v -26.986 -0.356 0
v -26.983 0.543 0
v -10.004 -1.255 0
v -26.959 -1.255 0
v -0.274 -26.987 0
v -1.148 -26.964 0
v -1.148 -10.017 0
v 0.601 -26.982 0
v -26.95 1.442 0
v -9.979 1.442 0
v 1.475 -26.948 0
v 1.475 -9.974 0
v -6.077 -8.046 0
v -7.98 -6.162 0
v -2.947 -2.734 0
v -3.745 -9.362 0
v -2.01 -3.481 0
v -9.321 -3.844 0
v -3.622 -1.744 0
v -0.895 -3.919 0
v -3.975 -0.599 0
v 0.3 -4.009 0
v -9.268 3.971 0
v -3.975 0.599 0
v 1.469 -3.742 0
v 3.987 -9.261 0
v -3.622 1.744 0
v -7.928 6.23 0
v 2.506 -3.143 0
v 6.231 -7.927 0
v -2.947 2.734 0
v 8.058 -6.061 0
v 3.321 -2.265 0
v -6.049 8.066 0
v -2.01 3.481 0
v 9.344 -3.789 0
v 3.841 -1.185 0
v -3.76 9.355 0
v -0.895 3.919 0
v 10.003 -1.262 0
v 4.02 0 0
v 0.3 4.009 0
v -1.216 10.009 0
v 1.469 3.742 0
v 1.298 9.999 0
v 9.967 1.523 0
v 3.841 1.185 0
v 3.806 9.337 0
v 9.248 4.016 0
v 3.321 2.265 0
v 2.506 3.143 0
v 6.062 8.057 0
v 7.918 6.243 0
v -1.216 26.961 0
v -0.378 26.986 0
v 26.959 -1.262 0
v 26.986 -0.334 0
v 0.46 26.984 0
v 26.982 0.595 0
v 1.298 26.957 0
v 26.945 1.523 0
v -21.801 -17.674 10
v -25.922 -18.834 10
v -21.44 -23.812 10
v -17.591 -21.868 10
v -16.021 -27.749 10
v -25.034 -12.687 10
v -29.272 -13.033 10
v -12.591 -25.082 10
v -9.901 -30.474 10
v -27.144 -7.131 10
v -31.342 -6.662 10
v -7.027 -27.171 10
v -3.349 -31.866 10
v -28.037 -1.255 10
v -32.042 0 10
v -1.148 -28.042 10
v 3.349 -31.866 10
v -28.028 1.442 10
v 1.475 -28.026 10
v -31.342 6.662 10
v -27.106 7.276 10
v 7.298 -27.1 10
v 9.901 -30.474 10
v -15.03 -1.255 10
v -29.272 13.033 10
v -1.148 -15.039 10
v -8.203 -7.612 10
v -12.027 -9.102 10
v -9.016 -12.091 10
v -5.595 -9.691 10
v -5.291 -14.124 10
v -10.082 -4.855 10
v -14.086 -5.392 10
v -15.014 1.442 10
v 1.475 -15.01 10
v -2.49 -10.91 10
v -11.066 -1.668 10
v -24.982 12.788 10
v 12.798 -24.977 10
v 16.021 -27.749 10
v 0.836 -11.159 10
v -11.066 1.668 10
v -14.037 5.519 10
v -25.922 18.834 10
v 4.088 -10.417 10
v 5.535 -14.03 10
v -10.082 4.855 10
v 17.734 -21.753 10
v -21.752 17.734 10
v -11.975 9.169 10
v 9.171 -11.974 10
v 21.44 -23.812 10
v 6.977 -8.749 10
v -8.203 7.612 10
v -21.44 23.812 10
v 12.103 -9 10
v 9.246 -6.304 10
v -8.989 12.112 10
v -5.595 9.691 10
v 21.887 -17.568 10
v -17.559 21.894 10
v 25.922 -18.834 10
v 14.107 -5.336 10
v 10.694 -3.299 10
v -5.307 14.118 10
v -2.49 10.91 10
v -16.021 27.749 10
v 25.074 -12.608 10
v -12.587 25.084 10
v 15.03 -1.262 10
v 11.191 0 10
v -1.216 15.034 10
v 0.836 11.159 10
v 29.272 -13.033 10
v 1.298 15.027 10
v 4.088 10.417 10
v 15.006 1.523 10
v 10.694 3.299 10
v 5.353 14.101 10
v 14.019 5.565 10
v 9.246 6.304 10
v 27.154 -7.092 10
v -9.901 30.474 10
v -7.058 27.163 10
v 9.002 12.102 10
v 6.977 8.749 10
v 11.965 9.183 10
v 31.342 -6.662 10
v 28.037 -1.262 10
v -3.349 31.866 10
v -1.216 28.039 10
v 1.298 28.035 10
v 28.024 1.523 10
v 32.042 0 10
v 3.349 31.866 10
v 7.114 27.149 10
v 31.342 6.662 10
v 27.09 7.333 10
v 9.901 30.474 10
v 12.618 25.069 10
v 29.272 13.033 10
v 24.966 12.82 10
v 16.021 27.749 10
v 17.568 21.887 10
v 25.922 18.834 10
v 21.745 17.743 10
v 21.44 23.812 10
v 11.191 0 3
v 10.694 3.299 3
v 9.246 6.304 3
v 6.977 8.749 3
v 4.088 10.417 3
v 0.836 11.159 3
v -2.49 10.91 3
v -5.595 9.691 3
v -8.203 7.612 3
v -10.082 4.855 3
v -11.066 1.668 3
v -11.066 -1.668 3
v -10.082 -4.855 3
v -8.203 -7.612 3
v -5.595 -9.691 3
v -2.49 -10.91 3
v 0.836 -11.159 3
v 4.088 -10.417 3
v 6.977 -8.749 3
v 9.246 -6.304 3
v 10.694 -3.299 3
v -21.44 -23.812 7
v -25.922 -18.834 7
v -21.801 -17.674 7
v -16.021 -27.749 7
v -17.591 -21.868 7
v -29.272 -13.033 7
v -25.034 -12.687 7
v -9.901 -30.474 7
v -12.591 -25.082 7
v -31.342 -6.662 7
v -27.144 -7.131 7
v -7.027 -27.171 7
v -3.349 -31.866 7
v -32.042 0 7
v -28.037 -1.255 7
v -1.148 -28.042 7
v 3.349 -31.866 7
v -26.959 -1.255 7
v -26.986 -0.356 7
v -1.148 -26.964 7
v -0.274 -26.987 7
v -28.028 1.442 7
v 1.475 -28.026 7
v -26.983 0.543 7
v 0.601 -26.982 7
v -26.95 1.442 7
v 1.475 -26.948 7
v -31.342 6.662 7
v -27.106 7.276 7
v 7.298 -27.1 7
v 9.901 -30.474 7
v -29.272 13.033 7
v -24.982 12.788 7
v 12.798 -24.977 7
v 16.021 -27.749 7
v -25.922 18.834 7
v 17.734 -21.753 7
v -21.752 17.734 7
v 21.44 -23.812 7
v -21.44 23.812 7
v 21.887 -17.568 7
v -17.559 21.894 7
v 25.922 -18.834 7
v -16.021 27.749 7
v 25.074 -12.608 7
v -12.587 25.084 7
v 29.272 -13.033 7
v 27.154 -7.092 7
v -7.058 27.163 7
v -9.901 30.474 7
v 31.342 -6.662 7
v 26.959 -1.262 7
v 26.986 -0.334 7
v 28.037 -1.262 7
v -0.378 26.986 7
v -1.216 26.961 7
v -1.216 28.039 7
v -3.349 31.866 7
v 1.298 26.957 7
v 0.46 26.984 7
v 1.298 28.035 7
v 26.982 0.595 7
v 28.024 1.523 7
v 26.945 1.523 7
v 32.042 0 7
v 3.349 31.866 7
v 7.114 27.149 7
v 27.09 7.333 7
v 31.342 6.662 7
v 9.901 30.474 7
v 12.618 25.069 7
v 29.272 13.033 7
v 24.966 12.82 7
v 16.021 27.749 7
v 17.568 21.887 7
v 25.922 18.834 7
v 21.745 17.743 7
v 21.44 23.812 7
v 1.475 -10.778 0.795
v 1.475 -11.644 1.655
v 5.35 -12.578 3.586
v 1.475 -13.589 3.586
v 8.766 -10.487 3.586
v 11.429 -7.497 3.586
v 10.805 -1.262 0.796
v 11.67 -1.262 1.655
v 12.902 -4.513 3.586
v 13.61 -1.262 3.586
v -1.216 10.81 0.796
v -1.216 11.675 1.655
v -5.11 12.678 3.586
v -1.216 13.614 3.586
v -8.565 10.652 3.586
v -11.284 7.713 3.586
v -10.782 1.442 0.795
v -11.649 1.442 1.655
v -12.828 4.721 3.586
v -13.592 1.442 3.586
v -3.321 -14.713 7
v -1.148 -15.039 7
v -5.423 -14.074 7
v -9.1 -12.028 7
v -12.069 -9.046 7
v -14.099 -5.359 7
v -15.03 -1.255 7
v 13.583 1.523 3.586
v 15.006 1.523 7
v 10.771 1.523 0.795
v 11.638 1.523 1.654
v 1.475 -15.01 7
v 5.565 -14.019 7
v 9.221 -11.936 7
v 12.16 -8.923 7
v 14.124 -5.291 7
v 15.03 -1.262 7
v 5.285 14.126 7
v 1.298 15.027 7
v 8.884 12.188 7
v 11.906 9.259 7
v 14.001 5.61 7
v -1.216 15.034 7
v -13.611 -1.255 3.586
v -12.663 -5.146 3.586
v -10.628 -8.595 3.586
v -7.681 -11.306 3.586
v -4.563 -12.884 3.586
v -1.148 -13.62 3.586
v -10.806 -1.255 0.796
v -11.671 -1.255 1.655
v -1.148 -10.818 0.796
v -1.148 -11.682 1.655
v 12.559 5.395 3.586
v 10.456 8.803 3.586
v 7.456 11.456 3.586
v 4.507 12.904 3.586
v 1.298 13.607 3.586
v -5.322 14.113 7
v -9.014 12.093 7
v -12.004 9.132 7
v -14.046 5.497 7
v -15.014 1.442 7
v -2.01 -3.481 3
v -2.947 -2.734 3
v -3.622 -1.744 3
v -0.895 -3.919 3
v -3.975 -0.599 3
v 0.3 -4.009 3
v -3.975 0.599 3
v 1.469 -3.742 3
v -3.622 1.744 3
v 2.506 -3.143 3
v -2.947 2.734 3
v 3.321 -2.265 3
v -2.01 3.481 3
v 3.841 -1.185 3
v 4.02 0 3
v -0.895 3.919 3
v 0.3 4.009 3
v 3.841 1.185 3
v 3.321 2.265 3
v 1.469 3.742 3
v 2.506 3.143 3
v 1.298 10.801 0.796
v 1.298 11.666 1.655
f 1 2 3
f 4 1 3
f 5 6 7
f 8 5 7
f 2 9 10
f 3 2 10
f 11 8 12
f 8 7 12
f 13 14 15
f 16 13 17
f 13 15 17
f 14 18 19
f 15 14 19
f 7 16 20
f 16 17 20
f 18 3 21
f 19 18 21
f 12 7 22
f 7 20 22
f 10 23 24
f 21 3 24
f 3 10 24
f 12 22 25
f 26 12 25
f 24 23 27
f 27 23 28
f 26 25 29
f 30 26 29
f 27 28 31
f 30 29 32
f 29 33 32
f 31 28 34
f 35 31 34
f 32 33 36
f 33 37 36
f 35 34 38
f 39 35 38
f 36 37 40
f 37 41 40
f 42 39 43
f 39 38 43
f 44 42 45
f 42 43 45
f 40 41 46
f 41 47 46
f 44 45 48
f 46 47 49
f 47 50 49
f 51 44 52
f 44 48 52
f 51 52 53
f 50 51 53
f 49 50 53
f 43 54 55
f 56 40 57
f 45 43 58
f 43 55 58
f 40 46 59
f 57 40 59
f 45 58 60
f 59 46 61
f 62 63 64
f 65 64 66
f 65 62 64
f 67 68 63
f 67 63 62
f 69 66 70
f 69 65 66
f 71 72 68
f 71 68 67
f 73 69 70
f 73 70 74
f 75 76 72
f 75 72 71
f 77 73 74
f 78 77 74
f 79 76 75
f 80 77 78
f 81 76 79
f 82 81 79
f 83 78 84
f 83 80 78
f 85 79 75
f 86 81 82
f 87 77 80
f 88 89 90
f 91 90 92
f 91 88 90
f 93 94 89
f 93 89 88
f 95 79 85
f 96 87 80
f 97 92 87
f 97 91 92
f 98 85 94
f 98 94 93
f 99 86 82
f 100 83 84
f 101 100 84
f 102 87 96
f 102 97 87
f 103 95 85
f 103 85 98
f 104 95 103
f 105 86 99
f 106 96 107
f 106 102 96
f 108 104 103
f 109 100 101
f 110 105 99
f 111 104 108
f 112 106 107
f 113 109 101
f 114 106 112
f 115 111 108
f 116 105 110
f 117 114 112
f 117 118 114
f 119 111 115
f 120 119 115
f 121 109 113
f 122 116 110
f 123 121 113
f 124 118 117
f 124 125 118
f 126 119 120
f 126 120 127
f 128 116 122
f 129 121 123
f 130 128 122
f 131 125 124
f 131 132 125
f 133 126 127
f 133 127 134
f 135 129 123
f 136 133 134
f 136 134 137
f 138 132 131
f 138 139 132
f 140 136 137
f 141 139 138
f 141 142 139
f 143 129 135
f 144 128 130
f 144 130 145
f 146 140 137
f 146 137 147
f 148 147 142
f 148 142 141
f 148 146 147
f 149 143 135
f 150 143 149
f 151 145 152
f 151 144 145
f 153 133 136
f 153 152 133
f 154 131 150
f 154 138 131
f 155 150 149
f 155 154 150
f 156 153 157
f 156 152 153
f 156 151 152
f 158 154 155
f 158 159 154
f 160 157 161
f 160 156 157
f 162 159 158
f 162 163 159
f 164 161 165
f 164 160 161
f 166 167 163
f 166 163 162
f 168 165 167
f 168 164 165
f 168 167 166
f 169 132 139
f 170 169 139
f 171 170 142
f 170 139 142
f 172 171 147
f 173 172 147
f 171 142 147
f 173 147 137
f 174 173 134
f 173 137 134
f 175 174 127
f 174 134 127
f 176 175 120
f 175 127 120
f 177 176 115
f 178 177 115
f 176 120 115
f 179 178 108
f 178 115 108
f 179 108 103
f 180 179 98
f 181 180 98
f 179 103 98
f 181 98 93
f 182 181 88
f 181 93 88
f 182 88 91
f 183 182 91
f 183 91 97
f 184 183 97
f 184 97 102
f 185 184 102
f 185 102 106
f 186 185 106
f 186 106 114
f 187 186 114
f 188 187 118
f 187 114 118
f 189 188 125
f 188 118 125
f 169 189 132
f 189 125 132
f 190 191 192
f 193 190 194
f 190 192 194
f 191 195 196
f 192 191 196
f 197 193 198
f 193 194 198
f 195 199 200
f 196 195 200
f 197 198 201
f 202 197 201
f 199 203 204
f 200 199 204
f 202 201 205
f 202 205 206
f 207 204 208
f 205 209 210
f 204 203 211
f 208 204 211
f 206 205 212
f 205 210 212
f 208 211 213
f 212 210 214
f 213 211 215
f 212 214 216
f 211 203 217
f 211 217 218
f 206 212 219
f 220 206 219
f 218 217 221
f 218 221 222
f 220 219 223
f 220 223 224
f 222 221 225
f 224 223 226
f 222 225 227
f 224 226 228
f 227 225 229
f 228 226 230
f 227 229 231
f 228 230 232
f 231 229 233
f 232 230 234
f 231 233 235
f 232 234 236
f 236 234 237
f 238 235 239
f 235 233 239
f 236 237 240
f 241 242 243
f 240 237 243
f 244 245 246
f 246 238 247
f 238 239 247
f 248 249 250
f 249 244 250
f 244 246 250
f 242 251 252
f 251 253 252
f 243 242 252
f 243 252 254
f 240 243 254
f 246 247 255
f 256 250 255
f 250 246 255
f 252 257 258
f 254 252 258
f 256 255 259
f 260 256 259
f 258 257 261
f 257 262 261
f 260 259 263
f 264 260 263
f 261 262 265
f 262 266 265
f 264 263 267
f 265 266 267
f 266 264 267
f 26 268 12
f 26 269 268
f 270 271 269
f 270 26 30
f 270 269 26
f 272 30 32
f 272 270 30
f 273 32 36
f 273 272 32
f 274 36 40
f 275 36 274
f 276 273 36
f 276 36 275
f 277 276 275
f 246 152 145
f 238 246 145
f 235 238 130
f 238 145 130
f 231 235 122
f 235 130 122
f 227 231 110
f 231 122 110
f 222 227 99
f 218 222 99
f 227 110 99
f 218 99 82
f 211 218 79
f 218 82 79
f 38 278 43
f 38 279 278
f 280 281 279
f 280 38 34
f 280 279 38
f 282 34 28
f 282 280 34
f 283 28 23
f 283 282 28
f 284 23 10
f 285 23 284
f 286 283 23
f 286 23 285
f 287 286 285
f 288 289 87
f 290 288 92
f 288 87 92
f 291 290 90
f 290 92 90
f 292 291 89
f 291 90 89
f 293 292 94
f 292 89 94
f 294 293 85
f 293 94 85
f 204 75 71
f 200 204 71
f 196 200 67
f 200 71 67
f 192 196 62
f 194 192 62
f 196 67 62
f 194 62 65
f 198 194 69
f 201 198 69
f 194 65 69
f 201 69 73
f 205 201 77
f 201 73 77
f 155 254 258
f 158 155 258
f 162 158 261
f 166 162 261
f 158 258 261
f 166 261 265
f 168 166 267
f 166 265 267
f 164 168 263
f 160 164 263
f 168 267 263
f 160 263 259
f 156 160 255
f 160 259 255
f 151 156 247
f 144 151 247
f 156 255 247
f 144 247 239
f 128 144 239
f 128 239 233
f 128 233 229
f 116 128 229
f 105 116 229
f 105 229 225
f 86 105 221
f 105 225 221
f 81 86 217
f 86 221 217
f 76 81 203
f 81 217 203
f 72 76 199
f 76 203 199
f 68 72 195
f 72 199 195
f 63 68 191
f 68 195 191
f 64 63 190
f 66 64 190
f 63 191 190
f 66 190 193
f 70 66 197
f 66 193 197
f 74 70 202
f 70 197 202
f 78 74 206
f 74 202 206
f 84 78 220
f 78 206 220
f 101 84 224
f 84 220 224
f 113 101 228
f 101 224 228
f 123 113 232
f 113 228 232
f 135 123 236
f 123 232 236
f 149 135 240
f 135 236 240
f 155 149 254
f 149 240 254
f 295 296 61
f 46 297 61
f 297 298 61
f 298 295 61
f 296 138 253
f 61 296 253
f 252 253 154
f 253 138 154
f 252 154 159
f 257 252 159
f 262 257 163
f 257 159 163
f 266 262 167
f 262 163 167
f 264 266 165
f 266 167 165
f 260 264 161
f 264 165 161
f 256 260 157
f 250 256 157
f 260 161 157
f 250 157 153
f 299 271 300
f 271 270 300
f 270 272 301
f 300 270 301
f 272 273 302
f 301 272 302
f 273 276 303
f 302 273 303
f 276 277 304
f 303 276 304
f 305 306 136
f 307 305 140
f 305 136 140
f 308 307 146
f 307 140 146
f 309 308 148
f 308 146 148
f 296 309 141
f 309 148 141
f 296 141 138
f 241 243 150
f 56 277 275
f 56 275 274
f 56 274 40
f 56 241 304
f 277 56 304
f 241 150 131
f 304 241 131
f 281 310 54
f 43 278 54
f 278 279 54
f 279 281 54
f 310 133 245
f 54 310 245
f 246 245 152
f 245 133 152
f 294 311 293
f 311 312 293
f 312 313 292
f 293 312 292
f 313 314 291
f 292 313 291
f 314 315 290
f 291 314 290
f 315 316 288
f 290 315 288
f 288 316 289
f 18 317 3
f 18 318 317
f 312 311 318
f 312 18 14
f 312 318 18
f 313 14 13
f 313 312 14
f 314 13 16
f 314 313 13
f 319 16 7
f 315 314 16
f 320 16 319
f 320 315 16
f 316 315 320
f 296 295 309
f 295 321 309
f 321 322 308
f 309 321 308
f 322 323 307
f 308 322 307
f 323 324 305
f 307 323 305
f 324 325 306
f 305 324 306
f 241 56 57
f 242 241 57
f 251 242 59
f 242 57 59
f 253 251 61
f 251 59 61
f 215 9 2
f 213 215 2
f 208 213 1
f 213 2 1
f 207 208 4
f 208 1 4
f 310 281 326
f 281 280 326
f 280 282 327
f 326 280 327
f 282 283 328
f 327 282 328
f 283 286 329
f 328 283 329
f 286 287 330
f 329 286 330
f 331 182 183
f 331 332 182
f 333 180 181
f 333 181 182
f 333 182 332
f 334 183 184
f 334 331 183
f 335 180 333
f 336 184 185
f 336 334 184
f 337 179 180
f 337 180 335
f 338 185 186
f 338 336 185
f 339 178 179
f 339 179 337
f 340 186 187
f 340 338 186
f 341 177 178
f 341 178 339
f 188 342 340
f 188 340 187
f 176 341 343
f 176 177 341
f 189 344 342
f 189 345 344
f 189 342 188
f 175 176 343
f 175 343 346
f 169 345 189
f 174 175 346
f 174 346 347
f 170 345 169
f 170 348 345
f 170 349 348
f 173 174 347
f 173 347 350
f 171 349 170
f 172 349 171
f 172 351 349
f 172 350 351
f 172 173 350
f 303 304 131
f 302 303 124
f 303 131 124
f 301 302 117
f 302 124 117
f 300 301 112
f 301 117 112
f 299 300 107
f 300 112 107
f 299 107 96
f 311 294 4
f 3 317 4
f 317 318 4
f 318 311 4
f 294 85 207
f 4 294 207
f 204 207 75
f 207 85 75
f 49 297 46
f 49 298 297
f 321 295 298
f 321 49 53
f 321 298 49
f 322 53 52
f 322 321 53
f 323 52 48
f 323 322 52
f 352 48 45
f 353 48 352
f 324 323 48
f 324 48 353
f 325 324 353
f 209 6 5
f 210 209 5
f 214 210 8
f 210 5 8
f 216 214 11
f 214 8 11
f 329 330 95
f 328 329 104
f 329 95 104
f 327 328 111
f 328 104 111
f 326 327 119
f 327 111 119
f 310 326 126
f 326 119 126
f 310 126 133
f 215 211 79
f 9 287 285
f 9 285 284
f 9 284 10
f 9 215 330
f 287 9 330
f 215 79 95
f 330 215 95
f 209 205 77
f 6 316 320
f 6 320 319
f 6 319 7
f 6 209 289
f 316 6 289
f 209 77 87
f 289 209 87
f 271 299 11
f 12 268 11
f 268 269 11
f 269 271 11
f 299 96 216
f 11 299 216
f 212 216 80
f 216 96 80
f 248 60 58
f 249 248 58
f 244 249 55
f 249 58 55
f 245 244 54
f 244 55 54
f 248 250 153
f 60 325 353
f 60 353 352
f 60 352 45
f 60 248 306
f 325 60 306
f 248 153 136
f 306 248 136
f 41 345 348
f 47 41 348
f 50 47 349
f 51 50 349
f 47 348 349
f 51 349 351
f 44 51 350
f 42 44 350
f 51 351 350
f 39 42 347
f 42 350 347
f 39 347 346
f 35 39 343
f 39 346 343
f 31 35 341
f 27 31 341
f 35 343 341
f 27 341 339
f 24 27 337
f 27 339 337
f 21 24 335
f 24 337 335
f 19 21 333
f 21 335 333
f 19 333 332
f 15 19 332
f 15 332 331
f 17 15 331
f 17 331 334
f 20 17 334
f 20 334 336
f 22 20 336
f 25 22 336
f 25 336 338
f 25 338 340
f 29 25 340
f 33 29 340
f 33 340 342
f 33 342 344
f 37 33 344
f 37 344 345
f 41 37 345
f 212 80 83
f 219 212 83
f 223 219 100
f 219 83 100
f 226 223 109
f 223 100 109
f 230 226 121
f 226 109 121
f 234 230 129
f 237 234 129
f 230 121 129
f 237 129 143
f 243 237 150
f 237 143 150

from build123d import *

# Parameters (mm, degrees)
F0_R     = 26.9884014256
F1_DEPTH = 7
F2_R     = 32.0417466588
F2_R_2   = 26.9884014256
F3_DEPTH = 3
F4_R     = 11.1906834264
F5_DEPTH = 7
F6_R     = 4.0199304585
F7_DEPTH = 25
F9_DEPTH = 25
F10_SIZE = 5
F11_SIZE = 2


with BuildPart() as f1:
    # F0 (on Top) → F1 (new body)
    with BuildSketch(Plane.XY):
        Circle(F0_R)
    extrude(amount=F1_DEPTH)

    # F2 (on face) → F3 (join)
    with BuildSketch(Plane.XY.offset(7)):
        Circle(F2_R)
        Circle(F2_R_2, mode=Mode.SUBTRACT)
        Circle(F2_R_2)
    extrude(amount=F3_DEPTH)

    # F4 (on face) → F5 (cut)
    with BuildSketch(Plane.XY.offset(10)):
        Circle(F4_R)
    extrude(amount=-F5_DEPTH, mode=Mode.SUBTRACT)

    # F6 (on face) → F7 (cut)
    with BuildSketch(Plane.XY.offset(3)):
        Circle(F6_R)
    extrude(amount=-F7_DEPTH, mode=Mode.SUBTRACT)

    # F8 (on face) → F9 (cut)
    with BuildSketch(Plane.XY.offset(10)):
        with BuildLine():
            ThreePointArc((-15.0136980872, 1.4416950877), (-10.584772446, 10.7448688798), (-1.2161651409, 15.0336475058))
            Line((-1.2161651409, 15.0336475058), (-1.2161651409, 28.0388555672))
            ThreePointArc((-1.2161651409, 28.0388555672), (-19.7651192157, 19.9247720578), (-28.0281643074, 1.4416950877))
            Line((-28.0281643074, 1.4416950877), (-15.0136980872, 1.4416950877))
        make_face()
        with BuildLine():
            ThreePointArc((1.2975777549, 15.0268395529), (10.5846814228, 10.7449585461), (15.0056430278, 1.5232505708))
            Line((15.0056430278, 1.5232505708), (28.0238503219, 1.5232505708))
            ThreePointArc((28.0238503219, 1.5232505708), (19.7650570518, 19.9248337234), (1.2975777549, 28.0352059228))
            Line((1.2975777549, 28.0352059228), (1.2975777549, 15.0268395529))
        make_face()
        with BuildLine():
            ThreePointArc((15.0298348497, -1.262410143), (10.7403927, -10.5893144079), (1.4751854085, -15.0104444634))
            Line((1.4751854085, -15.0104444634), (1.4751854085, -28.0264215906))
            ThreePointArc((1.4751854085, -28.0264215906), (19.9202803133, -19.7696462135), (28.0368115127, -1.262410143))
            Line((28.0368115127, -1.262410143), (15.0298348497, -1.262410143))
        make_face()
        with BuildLine():
            ThreePointArc((-1.1481693356, -15.038993389), (-10.6271050963, -10.7030020205), (-15.0304418379, -1.2551625933))
            Line((-15.0304418379, -1.2551625933), (-28.0371369086, -1.2551625933))
            ThreePointArc((-28.0371369086, -1.2551625933), (-19.8072075166, -19.8829326197), (-1.1481693356, -28.0417222428))
            Line((-1.1481693356, -28.0417222428), (-1.1481693356, -15.038993389))
        make_face()
    extrude(amount=-F9_DEPTH, mode=Mode.SUBTRACT)

    # F10
    f10_edges = [f1.edges().sort_by_distance(p)[0] for p in [
        (-10.584772, 10.744869, 0),
        (10.584681, 10.744959, 0),
        (-10.627105, -10.703002, 0),
        (10.740393, -10.589314, 0),
    ]]
    chamfer(f10_edges, length=F10_SIZE)

    # F11
    f11_edges = [f1.edges().sort_by_distance(p)[0] for p in [
        (10.740393, -10.589314, 5),
        (-10.627105, -10.703002, 5),
        (10.584681, 10.744959, 5),
        (-10.584772, 10.744869, 5),
    ]]
    chamfer(f11_edges, length=F11_SIZE)


solid = f1.part
